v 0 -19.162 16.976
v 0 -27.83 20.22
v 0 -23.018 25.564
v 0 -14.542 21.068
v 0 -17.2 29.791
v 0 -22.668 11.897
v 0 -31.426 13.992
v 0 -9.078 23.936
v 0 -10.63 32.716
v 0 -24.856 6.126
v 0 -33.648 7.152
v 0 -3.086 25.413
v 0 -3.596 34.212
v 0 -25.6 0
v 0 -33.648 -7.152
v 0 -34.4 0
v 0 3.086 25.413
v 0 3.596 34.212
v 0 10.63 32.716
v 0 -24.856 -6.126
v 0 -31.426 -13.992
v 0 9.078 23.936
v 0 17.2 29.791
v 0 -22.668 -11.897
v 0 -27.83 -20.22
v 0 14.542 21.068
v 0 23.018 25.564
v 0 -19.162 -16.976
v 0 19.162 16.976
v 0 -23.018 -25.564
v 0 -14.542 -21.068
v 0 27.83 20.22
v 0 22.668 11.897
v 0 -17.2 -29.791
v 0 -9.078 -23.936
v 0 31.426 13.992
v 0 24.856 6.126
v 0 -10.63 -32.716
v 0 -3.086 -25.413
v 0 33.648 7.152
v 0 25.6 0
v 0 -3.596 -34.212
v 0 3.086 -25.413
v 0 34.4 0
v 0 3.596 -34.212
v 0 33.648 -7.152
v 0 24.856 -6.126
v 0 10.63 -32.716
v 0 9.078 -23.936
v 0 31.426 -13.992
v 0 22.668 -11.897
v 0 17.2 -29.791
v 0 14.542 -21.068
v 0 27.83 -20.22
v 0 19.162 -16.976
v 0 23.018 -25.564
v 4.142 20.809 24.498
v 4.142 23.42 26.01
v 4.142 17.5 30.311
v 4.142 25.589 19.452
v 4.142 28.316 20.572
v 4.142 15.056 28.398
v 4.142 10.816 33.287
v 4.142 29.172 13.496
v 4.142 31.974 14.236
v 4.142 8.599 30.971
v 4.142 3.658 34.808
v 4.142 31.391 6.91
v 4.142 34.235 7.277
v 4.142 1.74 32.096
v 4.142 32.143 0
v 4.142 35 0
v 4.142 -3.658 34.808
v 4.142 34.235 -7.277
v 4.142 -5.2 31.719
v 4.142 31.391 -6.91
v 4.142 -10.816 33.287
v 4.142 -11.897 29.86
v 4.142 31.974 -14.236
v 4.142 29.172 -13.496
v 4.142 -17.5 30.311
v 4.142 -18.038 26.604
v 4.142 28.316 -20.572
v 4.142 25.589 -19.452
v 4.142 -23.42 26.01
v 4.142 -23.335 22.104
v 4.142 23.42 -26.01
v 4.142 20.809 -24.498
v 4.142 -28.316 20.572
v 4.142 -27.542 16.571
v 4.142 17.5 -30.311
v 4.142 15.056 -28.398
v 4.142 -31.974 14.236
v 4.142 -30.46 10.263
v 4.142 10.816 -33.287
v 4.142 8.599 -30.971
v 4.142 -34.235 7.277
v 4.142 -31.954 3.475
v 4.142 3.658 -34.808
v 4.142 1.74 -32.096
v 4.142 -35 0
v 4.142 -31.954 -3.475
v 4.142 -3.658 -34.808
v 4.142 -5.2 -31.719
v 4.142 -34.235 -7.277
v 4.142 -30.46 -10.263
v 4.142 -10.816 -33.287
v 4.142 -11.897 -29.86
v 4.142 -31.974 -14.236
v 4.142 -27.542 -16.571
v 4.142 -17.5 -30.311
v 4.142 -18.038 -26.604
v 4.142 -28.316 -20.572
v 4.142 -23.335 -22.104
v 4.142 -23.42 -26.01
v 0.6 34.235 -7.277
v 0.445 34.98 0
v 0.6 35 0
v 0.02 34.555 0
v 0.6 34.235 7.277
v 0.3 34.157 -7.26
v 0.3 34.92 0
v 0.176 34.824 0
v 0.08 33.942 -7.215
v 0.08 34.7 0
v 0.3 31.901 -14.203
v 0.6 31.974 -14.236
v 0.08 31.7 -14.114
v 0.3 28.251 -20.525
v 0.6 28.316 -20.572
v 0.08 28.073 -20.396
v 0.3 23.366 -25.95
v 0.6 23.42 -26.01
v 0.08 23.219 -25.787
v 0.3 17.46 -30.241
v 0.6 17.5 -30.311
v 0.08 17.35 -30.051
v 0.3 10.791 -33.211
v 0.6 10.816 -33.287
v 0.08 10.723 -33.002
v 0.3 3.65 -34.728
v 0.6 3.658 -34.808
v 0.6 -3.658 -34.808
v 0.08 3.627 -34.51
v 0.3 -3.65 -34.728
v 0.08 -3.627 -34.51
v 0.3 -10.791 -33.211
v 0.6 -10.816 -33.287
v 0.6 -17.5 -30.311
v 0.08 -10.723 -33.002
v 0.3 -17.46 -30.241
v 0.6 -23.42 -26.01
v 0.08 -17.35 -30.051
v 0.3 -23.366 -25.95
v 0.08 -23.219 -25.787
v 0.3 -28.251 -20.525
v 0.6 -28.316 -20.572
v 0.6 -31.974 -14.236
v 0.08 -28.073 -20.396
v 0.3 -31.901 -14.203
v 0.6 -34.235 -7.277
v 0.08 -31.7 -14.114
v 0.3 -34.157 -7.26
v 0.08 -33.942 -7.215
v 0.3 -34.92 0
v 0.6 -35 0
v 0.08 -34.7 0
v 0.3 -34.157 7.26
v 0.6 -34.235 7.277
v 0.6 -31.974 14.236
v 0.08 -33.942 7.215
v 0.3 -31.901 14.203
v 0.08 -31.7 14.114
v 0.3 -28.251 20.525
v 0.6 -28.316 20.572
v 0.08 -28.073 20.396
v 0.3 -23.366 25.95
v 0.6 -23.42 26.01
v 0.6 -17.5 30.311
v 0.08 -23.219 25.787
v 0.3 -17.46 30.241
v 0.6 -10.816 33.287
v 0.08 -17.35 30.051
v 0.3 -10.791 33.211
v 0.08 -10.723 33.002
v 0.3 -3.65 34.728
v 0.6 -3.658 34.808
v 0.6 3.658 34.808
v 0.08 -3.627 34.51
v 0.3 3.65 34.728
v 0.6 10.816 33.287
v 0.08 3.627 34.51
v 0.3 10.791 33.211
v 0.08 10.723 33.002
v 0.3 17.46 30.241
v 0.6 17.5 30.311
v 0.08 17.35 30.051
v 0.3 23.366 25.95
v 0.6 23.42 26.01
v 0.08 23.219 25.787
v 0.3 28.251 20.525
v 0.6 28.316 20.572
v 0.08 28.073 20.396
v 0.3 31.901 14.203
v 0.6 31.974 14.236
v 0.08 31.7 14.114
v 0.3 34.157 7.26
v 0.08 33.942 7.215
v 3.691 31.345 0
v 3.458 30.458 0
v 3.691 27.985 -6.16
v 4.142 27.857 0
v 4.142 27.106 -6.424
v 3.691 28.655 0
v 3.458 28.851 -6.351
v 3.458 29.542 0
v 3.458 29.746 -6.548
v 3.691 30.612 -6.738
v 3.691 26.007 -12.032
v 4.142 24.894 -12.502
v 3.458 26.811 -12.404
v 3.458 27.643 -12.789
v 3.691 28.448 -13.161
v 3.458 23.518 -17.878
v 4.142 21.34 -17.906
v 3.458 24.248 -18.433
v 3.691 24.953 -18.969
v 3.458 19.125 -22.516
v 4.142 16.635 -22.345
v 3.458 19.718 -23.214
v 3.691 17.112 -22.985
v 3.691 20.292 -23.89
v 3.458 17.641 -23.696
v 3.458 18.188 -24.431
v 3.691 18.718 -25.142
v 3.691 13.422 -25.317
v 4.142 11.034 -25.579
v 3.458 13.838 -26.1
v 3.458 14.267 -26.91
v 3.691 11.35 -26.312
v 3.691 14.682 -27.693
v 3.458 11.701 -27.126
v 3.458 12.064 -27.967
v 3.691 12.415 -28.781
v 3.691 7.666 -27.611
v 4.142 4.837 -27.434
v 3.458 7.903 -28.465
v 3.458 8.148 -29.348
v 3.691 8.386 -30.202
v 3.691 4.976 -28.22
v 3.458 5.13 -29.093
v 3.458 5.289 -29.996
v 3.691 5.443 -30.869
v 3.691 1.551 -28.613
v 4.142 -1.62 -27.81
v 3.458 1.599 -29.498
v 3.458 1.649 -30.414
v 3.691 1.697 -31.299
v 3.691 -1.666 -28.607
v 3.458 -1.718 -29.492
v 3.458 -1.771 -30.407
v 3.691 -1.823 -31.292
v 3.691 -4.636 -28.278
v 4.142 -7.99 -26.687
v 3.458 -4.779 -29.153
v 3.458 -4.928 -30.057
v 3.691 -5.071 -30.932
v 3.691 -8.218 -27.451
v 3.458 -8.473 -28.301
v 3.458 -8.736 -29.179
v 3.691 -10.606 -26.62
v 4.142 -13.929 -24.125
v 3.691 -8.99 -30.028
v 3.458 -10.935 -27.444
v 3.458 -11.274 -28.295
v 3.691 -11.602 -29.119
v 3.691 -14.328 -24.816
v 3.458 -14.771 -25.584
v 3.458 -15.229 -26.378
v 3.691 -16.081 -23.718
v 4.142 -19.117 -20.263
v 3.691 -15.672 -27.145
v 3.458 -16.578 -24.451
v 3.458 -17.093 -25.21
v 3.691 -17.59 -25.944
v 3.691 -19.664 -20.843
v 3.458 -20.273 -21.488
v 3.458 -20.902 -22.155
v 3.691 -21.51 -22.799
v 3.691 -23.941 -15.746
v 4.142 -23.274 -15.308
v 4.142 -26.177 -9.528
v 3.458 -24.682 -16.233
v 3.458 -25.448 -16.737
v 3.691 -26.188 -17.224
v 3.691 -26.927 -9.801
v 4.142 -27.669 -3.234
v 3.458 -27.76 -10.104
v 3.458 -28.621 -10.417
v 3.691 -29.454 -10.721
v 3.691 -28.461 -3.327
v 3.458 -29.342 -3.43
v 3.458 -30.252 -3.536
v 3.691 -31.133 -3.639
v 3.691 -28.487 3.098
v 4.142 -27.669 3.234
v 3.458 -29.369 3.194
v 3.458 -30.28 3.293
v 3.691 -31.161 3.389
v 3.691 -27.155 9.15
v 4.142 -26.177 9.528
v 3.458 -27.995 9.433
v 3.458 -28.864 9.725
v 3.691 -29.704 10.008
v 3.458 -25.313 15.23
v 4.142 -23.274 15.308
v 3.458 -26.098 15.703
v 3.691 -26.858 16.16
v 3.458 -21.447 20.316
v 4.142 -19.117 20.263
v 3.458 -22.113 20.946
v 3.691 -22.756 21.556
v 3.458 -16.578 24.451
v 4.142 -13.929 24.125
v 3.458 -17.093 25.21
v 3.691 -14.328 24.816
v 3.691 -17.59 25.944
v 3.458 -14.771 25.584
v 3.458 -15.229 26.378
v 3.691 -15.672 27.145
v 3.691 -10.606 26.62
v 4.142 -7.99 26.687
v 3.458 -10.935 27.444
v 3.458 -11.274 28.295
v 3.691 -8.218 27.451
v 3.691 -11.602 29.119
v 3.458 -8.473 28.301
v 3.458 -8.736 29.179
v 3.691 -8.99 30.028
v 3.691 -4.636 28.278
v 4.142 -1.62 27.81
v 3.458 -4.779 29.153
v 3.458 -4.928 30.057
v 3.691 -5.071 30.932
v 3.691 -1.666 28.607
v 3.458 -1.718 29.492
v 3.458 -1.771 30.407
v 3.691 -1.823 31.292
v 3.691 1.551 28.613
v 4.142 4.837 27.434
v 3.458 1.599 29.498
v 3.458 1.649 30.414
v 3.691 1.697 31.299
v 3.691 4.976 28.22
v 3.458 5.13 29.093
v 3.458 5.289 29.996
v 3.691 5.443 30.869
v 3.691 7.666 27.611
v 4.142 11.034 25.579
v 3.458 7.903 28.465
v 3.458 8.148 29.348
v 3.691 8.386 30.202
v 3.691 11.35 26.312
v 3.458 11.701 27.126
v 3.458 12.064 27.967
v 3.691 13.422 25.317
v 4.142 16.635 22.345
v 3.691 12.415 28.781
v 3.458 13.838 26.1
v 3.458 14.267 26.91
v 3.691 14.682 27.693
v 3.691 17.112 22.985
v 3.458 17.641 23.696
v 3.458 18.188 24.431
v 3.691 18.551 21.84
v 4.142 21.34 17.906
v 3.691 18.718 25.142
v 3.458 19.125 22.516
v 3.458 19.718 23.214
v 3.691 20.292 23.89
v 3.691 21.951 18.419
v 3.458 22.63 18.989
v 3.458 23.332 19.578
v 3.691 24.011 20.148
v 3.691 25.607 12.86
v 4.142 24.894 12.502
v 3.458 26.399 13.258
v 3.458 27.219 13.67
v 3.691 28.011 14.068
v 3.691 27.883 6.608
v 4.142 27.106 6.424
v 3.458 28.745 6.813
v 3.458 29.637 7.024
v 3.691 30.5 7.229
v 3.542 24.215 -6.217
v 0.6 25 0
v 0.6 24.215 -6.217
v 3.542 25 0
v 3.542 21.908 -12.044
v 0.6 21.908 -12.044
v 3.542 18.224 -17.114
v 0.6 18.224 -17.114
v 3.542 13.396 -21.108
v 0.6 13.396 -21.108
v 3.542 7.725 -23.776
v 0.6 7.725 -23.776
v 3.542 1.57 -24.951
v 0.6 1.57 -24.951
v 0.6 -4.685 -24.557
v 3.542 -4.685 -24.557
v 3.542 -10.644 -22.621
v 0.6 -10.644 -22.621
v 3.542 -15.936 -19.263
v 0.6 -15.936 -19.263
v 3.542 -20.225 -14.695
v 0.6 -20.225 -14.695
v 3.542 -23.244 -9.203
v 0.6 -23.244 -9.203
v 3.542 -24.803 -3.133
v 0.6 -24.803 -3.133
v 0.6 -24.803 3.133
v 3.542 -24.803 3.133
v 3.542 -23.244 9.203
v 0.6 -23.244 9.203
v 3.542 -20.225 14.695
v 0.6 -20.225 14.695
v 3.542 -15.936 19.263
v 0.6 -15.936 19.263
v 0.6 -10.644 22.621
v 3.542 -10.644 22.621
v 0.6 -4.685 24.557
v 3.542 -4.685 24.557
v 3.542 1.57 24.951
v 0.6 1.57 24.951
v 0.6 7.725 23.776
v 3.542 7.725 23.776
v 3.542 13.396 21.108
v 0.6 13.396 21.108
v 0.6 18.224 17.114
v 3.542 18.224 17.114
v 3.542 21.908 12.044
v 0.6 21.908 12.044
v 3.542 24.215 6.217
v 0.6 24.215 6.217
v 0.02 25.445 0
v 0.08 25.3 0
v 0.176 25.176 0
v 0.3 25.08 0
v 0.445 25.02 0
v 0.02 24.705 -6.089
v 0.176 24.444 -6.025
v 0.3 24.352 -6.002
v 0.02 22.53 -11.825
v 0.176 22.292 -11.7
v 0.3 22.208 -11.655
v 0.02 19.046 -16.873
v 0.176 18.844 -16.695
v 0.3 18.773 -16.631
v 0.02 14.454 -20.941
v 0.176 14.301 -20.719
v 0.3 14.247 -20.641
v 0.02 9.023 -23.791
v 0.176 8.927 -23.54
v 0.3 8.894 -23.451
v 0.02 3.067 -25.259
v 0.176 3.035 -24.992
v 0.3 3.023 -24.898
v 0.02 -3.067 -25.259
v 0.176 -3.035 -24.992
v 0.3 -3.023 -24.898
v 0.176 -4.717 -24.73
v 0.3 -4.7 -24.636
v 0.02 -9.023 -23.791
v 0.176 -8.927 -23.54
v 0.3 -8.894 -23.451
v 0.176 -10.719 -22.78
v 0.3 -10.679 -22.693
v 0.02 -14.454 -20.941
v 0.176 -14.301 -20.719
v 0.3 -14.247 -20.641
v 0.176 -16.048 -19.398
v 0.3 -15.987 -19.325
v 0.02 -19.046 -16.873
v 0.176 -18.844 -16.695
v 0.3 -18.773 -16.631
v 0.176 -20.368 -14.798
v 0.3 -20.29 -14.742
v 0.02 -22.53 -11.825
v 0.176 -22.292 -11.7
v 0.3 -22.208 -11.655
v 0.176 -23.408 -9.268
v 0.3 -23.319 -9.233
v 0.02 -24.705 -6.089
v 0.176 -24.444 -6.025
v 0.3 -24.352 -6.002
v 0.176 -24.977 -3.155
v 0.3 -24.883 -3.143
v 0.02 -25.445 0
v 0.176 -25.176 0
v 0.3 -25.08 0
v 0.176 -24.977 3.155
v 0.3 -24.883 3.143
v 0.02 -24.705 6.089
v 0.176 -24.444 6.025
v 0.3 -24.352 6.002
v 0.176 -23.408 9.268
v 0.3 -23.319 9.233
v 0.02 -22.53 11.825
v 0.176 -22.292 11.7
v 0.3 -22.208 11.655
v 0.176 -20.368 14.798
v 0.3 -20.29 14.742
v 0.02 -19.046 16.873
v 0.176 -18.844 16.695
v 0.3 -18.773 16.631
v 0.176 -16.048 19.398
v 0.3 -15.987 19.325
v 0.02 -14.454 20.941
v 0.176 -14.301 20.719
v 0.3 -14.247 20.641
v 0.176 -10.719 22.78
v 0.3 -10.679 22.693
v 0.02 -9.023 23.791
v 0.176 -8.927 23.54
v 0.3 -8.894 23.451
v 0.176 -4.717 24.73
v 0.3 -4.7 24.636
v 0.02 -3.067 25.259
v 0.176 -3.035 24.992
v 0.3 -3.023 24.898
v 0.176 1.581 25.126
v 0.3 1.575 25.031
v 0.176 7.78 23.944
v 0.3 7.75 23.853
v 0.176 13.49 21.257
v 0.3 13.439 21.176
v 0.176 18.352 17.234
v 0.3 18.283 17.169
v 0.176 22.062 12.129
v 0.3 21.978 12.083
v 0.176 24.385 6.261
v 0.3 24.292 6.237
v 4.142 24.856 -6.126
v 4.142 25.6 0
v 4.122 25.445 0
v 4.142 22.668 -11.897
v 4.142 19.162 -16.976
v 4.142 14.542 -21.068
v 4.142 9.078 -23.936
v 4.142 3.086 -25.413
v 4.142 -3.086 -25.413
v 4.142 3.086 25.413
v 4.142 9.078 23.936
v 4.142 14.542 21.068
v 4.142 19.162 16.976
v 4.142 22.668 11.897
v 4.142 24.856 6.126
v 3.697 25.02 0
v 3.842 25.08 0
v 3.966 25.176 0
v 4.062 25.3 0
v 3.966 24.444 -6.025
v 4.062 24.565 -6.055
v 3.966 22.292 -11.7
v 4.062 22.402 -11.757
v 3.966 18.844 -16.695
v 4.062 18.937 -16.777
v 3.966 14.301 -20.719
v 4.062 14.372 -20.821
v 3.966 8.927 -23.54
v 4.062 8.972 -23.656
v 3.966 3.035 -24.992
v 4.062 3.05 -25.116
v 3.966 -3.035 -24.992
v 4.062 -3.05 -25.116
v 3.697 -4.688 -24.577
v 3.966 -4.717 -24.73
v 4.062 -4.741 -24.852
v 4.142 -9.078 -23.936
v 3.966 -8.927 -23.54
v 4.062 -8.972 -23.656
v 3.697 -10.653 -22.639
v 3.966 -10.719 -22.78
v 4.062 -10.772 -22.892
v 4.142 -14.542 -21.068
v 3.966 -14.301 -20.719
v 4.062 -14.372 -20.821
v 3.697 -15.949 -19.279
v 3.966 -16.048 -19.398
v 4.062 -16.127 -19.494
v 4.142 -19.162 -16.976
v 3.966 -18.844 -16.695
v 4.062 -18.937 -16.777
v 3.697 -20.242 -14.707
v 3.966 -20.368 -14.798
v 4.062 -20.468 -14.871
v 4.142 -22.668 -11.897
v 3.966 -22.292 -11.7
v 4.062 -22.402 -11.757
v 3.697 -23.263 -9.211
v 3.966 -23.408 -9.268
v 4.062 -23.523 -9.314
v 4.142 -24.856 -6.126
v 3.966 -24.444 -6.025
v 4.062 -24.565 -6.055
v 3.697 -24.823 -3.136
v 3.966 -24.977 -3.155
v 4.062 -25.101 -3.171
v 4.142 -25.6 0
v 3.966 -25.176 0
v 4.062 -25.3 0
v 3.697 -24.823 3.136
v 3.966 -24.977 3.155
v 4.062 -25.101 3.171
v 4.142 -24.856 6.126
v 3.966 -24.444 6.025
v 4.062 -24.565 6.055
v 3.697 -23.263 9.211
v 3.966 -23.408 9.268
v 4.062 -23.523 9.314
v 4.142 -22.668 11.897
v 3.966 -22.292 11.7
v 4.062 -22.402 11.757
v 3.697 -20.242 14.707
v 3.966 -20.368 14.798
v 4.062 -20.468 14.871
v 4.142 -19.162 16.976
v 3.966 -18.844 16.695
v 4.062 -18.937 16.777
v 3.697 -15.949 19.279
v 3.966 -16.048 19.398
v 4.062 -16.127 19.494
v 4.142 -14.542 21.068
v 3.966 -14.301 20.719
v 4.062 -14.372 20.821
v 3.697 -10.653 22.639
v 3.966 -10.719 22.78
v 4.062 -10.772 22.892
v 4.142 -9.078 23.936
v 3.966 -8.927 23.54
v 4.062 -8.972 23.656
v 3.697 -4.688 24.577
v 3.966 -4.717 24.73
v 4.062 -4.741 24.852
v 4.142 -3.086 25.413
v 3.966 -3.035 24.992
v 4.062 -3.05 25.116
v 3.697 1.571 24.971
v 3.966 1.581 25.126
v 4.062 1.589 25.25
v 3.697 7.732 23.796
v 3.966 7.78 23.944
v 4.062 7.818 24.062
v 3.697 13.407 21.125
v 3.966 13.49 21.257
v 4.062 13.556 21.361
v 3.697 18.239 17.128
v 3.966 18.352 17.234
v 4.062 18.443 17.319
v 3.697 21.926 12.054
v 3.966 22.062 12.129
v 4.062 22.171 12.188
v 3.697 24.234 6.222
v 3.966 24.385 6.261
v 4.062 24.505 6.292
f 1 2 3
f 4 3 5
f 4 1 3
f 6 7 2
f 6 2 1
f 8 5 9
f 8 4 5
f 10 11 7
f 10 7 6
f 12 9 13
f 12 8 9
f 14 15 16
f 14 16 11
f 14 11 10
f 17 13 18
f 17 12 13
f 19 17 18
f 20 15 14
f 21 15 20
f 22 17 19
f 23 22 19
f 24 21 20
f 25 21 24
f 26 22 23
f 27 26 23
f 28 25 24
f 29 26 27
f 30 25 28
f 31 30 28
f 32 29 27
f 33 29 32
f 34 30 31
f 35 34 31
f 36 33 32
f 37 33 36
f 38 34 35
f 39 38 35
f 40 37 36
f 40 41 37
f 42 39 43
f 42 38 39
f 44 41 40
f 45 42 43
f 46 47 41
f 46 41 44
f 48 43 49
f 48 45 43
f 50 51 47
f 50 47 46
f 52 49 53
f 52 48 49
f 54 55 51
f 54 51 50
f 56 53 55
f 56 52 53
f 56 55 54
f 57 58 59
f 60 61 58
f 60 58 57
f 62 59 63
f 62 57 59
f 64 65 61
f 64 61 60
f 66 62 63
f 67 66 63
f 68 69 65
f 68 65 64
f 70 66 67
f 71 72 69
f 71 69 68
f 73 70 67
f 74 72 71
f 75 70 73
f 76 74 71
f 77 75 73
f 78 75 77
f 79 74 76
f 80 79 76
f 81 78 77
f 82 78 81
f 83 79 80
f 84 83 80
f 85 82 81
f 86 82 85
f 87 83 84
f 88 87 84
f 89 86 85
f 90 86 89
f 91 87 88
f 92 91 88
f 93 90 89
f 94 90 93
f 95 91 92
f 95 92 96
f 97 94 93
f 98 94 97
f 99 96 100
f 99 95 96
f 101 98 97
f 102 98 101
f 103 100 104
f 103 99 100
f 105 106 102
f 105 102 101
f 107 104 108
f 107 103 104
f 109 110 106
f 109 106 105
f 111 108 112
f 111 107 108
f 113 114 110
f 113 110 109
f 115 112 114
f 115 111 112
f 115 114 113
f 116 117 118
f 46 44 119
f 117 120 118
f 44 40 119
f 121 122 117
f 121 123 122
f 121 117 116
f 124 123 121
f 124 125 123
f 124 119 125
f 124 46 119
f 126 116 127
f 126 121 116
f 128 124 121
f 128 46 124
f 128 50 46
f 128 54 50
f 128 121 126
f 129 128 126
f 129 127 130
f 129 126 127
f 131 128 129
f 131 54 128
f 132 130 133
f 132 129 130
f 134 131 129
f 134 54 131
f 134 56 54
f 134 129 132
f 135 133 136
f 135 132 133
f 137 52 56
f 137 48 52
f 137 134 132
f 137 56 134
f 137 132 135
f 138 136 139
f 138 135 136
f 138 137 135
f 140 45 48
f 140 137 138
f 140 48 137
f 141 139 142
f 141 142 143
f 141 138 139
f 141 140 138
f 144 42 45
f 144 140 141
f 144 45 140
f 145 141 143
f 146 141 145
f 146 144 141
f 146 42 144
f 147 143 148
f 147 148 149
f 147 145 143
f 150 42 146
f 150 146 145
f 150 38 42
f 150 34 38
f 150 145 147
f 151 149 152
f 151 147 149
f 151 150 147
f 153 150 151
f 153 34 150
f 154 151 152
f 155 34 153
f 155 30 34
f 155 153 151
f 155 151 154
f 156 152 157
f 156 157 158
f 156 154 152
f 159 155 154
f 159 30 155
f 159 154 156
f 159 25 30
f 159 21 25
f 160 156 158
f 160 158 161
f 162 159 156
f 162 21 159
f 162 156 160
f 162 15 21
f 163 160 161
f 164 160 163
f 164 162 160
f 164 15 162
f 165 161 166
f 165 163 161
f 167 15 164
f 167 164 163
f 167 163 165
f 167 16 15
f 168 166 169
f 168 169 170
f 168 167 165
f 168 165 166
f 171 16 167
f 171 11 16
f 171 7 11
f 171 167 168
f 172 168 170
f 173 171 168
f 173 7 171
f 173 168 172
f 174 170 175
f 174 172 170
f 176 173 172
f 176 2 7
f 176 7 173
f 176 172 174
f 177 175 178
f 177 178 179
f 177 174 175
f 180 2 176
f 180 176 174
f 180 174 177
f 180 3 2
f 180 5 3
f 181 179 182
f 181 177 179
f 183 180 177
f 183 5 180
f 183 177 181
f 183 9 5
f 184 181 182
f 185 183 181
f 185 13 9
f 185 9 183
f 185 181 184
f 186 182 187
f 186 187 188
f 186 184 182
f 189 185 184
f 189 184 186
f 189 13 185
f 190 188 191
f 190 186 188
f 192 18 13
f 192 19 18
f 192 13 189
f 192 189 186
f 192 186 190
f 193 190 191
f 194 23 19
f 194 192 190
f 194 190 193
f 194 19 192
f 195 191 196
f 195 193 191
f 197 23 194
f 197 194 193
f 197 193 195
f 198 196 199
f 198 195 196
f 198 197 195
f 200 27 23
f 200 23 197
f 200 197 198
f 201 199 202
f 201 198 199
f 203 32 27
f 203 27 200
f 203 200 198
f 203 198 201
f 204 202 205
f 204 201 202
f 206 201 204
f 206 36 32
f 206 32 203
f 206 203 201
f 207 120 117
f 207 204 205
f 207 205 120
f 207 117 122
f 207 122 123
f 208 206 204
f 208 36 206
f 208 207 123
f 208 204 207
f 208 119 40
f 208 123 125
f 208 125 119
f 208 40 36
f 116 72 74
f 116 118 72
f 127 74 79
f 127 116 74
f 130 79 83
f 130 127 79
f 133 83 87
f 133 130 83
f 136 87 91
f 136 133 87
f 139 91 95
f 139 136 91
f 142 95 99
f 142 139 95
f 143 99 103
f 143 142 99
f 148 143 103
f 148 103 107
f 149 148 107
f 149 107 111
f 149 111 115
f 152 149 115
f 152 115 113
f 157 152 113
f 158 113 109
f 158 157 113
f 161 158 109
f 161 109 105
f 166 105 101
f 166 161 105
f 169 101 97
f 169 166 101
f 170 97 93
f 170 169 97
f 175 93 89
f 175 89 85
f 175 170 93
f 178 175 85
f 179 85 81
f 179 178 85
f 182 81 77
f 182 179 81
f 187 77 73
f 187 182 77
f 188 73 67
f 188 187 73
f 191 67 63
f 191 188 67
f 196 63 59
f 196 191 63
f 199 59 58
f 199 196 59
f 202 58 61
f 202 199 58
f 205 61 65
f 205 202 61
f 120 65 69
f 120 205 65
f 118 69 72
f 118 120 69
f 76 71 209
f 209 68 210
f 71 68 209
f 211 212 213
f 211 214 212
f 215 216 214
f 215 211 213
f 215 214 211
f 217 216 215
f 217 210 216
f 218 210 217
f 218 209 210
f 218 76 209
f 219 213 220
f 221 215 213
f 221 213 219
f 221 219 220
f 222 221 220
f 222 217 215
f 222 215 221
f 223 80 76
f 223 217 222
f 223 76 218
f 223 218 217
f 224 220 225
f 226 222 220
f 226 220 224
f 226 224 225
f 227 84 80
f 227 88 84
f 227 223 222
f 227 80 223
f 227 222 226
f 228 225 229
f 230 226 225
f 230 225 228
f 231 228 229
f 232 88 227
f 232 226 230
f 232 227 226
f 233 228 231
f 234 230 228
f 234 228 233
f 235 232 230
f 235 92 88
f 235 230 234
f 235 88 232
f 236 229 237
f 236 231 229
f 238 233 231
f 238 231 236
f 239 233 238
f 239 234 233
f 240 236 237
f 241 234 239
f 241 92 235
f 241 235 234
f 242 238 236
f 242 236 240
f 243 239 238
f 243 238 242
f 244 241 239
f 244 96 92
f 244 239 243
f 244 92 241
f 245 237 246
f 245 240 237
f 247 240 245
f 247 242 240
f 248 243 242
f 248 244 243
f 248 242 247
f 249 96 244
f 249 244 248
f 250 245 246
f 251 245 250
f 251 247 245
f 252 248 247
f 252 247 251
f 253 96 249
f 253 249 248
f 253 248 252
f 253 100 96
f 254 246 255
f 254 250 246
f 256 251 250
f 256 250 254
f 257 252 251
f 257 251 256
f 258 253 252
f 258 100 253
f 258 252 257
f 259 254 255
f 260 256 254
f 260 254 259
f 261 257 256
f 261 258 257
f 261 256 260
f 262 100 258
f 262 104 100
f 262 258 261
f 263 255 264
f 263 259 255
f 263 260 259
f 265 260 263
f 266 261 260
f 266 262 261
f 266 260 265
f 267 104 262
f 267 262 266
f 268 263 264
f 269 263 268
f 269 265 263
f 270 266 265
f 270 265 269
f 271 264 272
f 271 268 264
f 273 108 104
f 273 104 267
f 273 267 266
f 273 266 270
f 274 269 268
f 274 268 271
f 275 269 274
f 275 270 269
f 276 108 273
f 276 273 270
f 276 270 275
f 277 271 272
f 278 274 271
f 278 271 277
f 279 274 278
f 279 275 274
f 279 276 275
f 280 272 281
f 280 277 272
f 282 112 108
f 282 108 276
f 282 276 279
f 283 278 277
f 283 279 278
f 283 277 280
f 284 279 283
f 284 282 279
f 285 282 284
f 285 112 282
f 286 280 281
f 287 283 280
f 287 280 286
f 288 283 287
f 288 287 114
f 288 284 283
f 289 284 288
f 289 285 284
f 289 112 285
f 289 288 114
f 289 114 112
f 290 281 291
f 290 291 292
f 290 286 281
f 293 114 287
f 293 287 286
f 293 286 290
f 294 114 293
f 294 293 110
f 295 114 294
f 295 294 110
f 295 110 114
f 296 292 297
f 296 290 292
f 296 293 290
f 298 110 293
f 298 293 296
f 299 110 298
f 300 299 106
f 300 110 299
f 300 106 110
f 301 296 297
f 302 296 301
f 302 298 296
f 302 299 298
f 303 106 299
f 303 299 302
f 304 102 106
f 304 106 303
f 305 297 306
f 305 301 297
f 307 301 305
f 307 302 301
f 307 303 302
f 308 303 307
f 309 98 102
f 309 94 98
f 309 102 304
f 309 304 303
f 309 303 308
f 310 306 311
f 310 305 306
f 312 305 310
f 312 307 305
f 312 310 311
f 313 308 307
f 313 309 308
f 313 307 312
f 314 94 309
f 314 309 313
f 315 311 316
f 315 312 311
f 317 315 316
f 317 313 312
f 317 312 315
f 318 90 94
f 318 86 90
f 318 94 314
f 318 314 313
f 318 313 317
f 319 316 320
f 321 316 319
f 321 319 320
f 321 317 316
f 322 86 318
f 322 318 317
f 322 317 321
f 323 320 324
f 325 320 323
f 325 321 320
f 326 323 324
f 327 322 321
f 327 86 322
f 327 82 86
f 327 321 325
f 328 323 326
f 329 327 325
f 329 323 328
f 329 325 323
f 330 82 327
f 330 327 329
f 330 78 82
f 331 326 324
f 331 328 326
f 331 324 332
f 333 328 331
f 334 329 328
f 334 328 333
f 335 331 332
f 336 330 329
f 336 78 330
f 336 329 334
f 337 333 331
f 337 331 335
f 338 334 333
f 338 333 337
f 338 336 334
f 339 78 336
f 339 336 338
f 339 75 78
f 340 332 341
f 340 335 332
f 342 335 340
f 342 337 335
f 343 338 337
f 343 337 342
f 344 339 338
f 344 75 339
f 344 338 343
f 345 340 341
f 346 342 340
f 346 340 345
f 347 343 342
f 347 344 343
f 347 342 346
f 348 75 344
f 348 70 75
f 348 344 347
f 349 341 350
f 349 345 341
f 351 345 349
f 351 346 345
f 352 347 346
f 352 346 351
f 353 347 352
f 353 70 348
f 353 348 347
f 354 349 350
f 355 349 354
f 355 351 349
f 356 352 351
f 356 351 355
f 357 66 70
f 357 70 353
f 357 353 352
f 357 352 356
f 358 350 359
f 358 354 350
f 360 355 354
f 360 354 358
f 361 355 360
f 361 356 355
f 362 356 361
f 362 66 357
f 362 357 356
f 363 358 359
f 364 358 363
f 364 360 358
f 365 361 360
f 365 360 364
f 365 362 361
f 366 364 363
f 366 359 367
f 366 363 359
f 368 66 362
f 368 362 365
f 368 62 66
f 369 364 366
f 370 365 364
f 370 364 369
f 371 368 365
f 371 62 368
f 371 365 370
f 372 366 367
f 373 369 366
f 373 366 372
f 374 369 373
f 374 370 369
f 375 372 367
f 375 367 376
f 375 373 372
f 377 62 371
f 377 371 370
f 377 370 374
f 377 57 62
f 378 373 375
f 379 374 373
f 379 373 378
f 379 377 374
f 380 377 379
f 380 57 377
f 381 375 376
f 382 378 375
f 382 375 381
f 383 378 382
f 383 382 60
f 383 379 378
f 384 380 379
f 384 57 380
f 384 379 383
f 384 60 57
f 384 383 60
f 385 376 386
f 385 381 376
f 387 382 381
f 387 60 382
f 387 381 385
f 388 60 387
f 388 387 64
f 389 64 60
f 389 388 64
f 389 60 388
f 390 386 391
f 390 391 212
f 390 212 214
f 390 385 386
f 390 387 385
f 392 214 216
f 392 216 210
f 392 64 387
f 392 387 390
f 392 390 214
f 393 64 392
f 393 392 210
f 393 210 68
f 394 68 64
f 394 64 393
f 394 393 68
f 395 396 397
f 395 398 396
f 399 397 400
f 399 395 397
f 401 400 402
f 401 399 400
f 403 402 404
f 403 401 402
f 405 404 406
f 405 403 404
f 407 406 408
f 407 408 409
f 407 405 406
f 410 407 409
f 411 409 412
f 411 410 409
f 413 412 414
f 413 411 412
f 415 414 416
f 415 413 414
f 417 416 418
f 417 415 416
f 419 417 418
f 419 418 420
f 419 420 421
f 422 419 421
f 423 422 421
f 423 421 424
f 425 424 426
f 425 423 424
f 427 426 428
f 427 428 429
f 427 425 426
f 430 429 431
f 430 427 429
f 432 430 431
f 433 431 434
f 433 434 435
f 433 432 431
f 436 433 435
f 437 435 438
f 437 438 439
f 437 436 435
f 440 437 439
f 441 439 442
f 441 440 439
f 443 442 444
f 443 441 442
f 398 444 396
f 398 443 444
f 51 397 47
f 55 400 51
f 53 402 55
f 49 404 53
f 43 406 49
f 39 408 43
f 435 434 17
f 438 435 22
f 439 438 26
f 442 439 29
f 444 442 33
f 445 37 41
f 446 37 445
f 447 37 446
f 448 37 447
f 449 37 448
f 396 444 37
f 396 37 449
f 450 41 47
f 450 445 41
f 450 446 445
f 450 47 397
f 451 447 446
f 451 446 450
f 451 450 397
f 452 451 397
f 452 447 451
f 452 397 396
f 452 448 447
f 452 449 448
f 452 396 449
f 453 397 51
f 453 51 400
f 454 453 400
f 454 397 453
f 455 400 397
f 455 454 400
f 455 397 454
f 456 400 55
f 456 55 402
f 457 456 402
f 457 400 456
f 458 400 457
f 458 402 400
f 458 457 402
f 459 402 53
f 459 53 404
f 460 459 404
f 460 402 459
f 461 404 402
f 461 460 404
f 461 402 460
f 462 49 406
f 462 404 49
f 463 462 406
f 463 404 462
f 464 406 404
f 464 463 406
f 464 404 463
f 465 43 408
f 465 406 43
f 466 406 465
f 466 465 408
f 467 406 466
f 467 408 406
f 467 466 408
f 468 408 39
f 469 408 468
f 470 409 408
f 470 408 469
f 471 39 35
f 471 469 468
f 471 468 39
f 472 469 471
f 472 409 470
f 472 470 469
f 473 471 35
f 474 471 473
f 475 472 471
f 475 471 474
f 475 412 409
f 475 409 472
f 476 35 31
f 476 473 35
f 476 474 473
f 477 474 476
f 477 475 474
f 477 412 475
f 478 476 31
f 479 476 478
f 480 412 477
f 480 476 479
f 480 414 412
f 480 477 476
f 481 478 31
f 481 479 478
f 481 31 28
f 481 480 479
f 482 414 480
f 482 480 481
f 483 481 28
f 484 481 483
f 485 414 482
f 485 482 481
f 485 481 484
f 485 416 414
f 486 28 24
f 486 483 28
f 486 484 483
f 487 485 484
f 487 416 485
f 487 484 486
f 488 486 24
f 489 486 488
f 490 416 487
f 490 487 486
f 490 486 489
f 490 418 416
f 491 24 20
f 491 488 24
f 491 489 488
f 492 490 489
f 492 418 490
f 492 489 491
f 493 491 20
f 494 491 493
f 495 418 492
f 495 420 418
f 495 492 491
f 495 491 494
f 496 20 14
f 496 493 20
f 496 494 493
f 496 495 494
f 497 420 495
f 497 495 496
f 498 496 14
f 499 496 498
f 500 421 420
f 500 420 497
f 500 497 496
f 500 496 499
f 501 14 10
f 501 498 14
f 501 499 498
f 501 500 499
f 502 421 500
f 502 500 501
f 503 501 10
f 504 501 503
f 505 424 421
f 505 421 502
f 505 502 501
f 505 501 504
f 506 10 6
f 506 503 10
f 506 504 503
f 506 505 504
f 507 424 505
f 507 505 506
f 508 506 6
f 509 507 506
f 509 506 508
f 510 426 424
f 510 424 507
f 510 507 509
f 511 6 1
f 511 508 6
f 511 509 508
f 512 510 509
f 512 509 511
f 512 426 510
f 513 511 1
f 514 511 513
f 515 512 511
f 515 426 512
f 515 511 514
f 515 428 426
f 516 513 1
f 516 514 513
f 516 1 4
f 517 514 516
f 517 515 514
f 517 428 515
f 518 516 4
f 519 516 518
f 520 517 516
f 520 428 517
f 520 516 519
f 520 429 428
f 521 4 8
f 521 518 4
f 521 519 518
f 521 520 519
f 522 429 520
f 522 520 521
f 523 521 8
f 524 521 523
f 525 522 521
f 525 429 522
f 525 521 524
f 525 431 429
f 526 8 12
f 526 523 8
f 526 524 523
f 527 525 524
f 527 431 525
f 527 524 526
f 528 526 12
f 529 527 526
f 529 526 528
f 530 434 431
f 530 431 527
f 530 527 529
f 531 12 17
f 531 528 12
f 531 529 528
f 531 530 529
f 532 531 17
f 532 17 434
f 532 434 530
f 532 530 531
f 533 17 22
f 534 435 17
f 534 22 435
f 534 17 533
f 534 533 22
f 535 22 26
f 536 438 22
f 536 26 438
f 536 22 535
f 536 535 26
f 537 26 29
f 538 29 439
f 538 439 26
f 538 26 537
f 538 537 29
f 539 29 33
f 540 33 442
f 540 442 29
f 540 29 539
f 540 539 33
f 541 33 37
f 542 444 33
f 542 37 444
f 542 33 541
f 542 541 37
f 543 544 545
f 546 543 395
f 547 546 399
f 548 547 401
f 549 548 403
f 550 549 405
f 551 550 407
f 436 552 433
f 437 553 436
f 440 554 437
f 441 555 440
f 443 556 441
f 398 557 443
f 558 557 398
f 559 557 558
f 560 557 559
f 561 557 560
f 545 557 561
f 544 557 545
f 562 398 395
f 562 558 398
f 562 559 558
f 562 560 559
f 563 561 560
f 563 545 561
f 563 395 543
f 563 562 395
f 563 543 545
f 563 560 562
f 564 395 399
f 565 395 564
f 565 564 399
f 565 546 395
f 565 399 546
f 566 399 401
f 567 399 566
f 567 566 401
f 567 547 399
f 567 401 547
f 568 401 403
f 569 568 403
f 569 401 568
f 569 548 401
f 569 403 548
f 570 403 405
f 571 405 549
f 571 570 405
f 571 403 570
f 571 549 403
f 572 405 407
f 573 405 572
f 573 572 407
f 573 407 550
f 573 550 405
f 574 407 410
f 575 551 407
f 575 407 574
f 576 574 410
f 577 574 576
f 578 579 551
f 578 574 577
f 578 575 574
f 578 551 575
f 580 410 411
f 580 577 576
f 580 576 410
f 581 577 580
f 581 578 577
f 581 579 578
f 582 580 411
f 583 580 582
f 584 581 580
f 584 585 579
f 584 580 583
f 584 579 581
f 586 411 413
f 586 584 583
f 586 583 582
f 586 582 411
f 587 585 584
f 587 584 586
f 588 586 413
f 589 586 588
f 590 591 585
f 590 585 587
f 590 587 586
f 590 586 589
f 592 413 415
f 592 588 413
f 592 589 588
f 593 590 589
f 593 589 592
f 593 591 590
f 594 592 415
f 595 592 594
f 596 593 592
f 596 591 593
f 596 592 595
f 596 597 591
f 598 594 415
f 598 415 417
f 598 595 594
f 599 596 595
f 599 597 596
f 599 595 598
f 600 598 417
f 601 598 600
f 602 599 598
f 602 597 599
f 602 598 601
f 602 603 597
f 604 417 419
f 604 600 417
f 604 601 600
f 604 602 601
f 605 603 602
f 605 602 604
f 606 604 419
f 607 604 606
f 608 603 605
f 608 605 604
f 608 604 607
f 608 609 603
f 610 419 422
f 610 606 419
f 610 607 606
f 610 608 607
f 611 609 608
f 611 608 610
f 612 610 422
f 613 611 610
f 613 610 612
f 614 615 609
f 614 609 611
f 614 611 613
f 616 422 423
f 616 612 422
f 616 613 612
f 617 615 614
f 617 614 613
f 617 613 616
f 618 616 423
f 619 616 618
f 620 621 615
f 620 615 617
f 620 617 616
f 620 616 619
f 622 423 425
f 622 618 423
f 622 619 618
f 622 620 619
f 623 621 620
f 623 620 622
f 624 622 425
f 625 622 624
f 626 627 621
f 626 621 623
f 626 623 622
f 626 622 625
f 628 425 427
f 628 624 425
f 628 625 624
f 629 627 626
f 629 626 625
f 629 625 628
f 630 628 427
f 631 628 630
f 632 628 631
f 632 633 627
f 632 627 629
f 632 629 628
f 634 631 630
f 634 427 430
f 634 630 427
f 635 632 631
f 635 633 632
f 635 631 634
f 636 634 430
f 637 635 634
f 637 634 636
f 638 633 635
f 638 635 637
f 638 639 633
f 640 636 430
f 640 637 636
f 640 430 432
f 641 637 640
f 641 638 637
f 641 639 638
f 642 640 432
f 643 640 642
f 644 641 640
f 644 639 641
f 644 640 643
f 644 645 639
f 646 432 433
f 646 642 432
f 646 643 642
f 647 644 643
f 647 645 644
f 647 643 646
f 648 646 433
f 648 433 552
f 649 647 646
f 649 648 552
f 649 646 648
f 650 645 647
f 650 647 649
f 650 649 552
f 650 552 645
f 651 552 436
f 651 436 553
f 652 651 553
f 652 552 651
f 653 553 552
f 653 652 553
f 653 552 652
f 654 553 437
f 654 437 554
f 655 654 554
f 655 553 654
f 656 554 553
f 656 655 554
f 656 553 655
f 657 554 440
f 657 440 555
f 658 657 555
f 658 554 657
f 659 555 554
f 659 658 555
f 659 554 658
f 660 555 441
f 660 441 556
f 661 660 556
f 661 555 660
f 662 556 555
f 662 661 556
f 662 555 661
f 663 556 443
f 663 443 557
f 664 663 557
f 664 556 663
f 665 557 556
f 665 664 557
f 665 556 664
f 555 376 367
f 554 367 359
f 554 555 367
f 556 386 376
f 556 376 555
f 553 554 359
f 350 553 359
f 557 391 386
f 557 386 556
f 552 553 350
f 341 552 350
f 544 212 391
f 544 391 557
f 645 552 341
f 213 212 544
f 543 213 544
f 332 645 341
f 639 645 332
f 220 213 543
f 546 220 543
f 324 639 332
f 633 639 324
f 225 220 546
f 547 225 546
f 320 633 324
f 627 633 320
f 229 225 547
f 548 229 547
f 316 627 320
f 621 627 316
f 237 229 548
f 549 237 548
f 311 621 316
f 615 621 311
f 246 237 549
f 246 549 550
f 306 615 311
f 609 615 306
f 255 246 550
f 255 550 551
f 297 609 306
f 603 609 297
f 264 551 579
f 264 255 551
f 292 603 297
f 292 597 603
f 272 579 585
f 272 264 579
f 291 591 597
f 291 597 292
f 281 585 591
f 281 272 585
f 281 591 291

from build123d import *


with BuildPart() as part:
    # Croquis1 → Revolución1 (revolve)
    with BuildSketch(Plane.XY):
        with BuildLine():
            Line((0.6, 25), (3.542, 25))
            ThreePointArc((3.542, 25), (3.966264069, 25.175735931), (4.142, 25.6))
            Line((4.142, 25.6), (4.142, 27.857333437))
            ThreePointArc((4.142, 27.857333437), (3.428, 30), (4.142, 32.142666563))
            Line((4.142, 32.142666563), (4.142, 35))
            Line((4.142, 35), (0.6, 35))
            ThreePointArc((0.6, 35), (0.175735931, 34.824264069), (0, 34.4))
            Line((0, 34.4), (0, 25.6))
            ThreePointArc((0, 25.6), (0.175735931, 25.175735931), (0.6, 25))
        make_face()
    revolve(axis=Axis((3.542, 0, 0), (-1, 0, 0)))


solid = part.part
